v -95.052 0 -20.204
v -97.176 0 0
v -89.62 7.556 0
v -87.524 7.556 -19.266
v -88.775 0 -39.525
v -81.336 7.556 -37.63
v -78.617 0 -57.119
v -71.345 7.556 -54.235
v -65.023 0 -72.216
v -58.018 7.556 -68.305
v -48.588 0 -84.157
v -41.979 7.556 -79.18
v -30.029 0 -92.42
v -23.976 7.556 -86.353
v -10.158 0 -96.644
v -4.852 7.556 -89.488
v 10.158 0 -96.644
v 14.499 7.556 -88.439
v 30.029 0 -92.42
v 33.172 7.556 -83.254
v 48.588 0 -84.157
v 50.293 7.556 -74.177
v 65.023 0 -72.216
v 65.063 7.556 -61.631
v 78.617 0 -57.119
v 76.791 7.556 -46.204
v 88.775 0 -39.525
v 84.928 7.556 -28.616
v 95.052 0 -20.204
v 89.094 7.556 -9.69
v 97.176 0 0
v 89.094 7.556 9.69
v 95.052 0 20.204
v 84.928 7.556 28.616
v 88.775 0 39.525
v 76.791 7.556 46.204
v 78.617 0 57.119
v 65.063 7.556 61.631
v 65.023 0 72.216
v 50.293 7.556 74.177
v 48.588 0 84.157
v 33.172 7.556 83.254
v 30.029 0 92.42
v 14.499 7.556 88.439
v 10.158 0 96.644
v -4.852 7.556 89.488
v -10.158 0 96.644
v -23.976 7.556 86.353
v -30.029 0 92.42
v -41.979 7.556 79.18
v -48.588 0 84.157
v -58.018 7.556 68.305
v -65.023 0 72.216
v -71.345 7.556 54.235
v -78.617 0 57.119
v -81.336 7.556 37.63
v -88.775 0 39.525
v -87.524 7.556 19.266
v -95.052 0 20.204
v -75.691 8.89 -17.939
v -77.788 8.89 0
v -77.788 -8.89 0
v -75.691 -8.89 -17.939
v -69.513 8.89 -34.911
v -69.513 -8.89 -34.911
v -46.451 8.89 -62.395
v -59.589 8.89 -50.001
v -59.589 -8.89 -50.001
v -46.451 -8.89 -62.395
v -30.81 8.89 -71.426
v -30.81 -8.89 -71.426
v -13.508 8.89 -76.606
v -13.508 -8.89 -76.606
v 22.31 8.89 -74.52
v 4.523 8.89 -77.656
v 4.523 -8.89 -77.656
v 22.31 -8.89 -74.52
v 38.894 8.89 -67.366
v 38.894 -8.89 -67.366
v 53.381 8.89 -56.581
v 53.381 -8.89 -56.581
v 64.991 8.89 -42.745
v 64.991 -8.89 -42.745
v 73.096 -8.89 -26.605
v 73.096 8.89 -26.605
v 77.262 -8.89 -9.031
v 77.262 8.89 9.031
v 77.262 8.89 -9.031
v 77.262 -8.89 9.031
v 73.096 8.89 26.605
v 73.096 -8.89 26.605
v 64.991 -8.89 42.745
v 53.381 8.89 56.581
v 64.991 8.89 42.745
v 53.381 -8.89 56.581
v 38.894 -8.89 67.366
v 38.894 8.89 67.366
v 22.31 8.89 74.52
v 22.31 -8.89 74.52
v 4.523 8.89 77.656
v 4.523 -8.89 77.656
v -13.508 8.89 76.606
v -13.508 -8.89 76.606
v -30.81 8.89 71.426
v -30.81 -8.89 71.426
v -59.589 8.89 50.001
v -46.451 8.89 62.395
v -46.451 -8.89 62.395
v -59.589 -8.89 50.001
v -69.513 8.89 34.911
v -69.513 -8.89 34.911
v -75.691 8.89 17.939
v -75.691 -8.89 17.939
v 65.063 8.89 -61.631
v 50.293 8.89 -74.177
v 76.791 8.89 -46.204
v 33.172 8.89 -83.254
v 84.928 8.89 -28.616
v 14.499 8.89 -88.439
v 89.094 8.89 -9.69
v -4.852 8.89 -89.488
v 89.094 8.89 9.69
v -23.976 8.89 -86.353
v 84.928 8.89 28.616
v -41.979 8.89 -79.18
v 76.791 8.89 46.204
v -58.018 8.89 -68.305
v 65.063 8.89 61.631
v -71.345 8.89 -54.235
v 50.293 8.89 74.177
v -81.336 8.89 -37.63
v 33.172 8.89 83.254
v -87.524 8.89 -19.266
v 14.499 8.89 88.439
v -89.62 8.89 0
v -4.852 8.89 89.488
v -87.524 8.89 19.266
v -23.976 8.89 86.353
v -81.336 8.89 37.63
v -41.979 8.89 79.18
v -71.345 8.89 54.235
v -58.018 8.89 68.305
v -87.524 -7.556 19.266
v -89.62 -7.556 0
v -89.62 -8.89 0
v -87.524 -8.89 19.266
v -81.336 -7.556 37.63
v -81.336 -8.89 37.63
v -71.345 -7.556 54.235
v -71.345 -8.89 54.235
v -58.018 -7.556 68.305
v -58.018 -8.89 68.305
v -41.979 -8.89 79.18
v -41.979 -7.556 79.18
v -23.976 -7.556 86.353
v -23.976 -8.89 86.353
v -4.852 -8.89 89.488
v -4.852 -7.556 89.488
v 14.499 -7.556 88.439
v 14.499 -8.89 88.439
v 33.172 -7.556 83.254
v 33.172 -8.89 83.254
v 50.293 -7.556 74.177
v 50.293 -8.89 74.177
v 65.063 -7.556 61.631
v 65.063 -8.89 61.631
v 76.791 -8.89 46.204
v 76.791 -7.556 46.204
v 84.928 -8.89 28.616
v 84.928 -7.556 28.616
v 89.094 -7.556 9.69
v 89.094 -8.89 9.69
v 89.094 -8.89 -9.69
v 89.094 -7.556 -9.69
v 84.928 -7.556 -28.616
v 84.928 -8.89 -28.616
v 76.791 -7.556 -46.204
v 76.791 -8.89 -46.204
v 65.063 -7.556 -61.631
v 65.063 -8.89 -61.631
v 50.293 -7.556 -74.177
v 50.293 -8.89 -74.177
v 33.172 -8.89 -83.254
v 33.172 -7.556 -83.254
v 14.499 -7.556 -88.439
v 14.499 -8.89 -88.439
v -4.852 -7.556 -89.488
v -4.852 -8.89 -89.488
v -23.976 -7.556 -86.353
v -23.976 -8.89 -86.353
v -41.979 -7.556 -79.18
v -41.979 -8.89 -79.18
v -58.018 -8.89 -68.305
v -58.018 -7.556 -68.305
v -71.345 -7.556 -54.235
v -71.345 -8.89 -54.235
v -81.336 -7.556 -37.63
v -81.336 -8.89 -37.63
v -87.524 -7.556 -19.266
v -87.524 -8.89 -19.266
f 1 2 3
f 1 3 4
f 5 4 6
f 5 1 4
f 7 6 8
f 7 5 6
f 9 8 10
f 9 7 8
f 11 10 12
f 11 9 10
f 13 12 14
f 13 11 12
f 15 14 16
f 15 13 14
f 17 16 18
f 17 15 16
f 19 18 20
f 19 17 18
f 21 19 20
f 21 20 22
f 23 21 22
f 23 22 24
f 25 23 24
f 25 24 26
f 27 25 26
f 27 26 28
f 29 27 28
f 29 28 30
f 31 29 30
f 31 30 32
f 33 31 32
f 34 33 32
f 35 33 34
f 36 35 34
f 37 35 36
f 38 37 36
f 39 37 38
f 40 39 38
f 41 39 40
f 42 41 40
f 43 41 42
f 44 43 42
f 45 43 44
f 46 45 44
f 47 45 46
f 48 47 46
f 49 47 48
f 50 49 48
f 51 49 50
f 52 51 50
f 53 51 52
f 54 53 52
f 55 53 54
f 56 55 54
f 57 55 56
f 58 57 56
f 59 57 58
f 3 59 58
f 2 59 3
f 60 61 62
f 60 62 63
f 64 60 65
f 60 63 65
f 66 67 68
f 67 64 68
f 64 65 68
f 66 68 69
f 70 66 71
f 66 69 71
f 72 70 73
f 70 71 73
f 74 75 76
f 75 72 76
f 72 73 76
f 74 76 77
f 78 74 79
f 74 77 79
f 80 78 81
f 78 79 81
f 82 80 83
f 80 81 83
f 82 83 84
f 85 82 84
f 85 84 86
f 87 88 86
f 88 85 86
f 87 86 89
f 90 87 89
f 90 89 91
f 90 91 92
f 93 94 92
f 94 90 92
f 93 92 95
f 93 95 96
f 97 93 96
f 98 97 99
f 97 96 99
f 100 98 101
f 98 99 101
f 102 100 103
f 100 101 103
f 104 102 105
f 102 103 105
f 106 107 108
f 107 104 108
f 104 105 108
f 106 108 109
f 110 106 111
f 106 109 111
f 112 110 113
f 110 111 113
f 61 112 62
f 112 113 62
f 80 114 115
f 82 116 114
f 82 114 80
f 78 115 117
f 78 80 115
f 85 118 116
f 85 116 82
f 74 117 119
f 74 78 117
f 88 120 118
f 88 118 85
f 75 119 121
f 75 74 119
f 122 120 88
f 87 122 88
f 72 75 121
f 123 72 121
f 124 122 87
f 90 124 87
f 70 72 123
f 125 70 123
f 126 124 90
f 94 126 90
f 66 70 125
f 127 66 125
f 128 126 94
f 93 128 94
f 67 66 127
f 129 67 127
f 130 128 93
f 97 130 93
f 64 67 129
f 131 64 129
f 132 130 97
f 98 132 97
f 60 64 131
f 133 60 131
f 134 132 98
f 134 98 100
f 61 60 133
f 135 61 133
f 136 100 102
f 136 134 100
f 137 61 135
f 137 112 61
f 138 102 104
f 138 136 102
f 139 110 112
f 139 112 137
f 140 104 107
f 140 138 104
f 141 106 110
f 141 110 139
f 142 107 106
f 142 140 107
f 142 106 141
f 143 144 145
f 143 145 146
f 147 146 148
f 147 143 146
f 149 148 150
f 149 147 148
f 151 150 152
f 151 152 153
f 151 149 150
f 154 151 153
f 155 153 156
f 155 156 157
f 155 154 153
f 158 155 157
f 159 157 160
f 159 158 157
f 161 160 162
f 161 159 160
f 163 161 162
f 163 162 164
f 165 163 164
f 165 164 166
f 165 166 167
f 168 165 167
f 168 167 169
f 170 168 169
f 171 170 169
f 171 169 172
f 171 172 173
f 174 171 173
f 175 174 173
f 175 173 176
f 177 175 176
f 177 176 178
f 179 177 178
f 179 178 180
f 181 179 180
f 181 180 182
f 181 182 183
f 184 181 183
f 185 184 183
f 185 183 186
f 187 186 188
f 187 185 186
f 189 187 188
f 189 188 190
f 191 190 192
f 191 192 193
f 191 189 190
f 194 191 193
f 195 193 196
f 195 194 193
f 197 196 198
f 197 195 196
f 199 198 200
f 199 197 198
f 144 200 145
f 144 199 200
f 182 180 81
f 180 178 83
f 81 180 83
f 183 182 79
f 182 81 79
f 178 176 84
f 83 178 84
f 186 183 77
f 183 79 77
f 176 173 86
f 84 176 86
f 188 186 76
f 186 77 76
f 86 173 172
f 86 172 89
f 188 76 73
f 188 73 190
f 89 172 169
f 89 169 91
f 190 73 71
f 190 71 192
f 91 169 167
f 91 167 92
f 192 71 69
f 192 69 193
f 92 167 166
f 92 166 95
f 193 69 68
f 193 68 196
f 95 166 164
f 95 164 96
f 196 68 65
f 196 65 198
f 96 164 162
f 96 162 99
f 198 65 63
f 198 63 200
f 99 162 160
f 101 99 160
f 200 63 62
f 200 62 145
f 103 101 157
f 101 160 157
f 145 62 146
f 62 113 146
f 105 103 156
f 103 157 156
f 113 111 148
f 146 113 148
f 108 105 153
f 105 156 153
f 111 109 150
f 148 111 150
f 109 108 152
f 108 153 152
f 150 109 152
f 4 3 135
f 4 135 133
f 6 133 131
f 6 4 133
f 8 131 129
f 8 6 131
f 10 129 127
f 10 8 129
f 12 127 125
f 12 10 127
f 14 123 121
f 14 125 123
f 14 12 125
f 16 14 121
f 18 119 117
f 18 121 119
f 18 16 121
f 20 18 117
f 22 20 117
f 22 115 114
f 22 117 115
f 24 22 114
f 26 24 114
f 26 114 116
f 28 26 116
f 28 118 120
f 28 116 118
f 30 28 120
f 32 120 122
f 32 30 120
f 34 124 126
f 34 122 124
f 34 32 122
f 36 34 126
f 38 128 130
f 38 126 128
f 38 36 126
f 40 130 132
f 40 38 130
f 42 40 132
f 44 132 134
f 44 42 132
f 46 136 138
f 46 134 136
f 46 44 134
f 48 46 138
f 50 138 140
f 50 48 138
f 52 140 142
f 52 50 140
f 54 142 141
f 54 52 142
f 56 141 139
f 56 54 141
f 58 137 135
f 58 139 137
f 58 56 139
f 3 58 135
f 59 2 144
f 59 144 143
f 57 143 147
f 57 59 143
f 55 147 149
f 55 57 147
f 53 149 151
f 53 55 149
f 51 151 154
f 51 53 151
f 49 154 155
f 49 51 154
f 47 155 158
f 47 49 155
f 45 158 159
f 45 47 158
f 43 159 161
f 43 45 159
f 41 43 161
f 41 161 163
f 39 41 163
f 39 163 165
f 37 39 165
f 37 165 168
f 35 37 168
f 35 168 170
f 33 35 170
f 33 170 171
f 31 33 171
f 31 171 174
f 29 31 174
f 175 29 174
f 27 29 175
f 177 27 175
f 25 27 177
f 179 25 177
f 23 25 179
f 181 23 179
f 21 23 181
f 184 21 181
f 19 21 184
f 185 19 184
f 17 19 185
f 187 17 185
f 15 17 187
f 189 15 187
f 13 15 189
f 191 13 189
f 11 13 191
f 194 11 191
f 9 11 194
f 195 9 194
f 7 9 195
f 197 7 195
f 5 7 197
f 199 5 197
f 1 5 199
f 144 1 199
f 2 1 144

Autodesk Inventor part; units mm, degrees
ref_plane "YZ Plane" through (0, 0, 0) normal (1, 0, 0) x (0, 1, 0)
ref_plane "XZ Plane" through (0, 0, 0) normal (0, 1, 0) x (-1, 0, 0)
ref_plane "XY Plane" through (0, 0, 0) normal (0, 0, 1) x (1, 0, 0)
sketch "Sketch1" plane through (0, 0, 0) normal (0, 0, 1) x (1, 0, 0)
  line L0 (0, -8.2641) -> (0, 19.7359)
  line L1 (-162.5659, 0) -> (21.6343, 0) construction
  line L2 (-107.95, 8.89) -> (-107.95, -8.89) construction
  line L3 (-107.95, 8.89) -> (-90.3815, 8.89) construction
  line L4 (-90.3815, 8.89) -> (-90.3815, 7.3025) construction
  line L5 (-90.3815, 7.3025) -> (-91.504, 6.18) construction
  line L6 (-91.504, 6.18) -> (-92.9409, 7.6168) construction
  line L7 (-92.9409, 7.6168) -> (-95.186, 5.3717) construction
  line L8 (-95.186, 5.3717) -> (-93.7491, 3.9349) construction
  line L9 (-93.7491, 3.9349) -> (-97.684, 0) construction
  line L10 (-97.176, 0) -> (-84.8354, 12.3406) construction
  line L11 (-94.0634, 6.4943) -> (-92.3726, 4.8034) construction
  circle A0 centre (-93.218, 5.6489) radius 1.3081 construction
  line L12 (-90.3815, -8.89) -> (-90.3815, -7.3025) construction
  line L13 (-90.3815, -7.3025) -> (-91.504, -6.18) construction
  line L14 (-91.504, -6.18) -> (-92.9409, -7.6168) construction
  line L15 (-92.9409, -7.6168) -> (-95.186, -5.3717) construction
  line L16 (-95.186, -5.3717) -> (-93.7491, -3.9349) construction
  line L17 (-93.7491, -3.9349) -> (-97.684, 0) construction
  line L18 (-107.95, -8.89) -> (-90.3815, -8.89) construction
  line L19 (-89.6195, 8.89) -> (-89.6195, 7.5565)
  line L20 (-89.6195, 7.5565) -> (-97.176, 0)
  line L21 (-89.6195, 8.89) -> (-77.7875, 8.89)
  line L22 (-77.7875, 8.89) -> (-77.7875, -8.89)
  line L23 (-89.6195, -8.89) -> (-89.6195, -7.5565)
  line L24 (-89.6195, -7.5565) -> (-97.176, 0)
  line L25 (-89.6195, -8.89) -> (-77.7875, -8.89)
  point P0 (0, 0)
  point P1 (0, 0)
  point P2 (0, 0)
  dimension "d23" = 1.5875
  dimension "d24" = 2.032
  dimension "d25" = 45
  dimension "d26" = 0.508
  dimension "d27" = 3.175
  dimension "d28" = 2.6162
  dimension "d29" = 186.436
  dimension "d30" = 215.9
  dimension "d31" = 17.78
  dimension "d32" = 1.5875
  dimension "d33" = 0.762
  dimension "d34" = 155.575
  dimension "d35" = 17.78
revolve "Revolution1" add sketch "Sketch1" angle 360 about axis through (0, -8.2641, 0) along (0, 1, 0)
properties part number "3DPRINT,INNER-V" material "Nylon 6/6"
